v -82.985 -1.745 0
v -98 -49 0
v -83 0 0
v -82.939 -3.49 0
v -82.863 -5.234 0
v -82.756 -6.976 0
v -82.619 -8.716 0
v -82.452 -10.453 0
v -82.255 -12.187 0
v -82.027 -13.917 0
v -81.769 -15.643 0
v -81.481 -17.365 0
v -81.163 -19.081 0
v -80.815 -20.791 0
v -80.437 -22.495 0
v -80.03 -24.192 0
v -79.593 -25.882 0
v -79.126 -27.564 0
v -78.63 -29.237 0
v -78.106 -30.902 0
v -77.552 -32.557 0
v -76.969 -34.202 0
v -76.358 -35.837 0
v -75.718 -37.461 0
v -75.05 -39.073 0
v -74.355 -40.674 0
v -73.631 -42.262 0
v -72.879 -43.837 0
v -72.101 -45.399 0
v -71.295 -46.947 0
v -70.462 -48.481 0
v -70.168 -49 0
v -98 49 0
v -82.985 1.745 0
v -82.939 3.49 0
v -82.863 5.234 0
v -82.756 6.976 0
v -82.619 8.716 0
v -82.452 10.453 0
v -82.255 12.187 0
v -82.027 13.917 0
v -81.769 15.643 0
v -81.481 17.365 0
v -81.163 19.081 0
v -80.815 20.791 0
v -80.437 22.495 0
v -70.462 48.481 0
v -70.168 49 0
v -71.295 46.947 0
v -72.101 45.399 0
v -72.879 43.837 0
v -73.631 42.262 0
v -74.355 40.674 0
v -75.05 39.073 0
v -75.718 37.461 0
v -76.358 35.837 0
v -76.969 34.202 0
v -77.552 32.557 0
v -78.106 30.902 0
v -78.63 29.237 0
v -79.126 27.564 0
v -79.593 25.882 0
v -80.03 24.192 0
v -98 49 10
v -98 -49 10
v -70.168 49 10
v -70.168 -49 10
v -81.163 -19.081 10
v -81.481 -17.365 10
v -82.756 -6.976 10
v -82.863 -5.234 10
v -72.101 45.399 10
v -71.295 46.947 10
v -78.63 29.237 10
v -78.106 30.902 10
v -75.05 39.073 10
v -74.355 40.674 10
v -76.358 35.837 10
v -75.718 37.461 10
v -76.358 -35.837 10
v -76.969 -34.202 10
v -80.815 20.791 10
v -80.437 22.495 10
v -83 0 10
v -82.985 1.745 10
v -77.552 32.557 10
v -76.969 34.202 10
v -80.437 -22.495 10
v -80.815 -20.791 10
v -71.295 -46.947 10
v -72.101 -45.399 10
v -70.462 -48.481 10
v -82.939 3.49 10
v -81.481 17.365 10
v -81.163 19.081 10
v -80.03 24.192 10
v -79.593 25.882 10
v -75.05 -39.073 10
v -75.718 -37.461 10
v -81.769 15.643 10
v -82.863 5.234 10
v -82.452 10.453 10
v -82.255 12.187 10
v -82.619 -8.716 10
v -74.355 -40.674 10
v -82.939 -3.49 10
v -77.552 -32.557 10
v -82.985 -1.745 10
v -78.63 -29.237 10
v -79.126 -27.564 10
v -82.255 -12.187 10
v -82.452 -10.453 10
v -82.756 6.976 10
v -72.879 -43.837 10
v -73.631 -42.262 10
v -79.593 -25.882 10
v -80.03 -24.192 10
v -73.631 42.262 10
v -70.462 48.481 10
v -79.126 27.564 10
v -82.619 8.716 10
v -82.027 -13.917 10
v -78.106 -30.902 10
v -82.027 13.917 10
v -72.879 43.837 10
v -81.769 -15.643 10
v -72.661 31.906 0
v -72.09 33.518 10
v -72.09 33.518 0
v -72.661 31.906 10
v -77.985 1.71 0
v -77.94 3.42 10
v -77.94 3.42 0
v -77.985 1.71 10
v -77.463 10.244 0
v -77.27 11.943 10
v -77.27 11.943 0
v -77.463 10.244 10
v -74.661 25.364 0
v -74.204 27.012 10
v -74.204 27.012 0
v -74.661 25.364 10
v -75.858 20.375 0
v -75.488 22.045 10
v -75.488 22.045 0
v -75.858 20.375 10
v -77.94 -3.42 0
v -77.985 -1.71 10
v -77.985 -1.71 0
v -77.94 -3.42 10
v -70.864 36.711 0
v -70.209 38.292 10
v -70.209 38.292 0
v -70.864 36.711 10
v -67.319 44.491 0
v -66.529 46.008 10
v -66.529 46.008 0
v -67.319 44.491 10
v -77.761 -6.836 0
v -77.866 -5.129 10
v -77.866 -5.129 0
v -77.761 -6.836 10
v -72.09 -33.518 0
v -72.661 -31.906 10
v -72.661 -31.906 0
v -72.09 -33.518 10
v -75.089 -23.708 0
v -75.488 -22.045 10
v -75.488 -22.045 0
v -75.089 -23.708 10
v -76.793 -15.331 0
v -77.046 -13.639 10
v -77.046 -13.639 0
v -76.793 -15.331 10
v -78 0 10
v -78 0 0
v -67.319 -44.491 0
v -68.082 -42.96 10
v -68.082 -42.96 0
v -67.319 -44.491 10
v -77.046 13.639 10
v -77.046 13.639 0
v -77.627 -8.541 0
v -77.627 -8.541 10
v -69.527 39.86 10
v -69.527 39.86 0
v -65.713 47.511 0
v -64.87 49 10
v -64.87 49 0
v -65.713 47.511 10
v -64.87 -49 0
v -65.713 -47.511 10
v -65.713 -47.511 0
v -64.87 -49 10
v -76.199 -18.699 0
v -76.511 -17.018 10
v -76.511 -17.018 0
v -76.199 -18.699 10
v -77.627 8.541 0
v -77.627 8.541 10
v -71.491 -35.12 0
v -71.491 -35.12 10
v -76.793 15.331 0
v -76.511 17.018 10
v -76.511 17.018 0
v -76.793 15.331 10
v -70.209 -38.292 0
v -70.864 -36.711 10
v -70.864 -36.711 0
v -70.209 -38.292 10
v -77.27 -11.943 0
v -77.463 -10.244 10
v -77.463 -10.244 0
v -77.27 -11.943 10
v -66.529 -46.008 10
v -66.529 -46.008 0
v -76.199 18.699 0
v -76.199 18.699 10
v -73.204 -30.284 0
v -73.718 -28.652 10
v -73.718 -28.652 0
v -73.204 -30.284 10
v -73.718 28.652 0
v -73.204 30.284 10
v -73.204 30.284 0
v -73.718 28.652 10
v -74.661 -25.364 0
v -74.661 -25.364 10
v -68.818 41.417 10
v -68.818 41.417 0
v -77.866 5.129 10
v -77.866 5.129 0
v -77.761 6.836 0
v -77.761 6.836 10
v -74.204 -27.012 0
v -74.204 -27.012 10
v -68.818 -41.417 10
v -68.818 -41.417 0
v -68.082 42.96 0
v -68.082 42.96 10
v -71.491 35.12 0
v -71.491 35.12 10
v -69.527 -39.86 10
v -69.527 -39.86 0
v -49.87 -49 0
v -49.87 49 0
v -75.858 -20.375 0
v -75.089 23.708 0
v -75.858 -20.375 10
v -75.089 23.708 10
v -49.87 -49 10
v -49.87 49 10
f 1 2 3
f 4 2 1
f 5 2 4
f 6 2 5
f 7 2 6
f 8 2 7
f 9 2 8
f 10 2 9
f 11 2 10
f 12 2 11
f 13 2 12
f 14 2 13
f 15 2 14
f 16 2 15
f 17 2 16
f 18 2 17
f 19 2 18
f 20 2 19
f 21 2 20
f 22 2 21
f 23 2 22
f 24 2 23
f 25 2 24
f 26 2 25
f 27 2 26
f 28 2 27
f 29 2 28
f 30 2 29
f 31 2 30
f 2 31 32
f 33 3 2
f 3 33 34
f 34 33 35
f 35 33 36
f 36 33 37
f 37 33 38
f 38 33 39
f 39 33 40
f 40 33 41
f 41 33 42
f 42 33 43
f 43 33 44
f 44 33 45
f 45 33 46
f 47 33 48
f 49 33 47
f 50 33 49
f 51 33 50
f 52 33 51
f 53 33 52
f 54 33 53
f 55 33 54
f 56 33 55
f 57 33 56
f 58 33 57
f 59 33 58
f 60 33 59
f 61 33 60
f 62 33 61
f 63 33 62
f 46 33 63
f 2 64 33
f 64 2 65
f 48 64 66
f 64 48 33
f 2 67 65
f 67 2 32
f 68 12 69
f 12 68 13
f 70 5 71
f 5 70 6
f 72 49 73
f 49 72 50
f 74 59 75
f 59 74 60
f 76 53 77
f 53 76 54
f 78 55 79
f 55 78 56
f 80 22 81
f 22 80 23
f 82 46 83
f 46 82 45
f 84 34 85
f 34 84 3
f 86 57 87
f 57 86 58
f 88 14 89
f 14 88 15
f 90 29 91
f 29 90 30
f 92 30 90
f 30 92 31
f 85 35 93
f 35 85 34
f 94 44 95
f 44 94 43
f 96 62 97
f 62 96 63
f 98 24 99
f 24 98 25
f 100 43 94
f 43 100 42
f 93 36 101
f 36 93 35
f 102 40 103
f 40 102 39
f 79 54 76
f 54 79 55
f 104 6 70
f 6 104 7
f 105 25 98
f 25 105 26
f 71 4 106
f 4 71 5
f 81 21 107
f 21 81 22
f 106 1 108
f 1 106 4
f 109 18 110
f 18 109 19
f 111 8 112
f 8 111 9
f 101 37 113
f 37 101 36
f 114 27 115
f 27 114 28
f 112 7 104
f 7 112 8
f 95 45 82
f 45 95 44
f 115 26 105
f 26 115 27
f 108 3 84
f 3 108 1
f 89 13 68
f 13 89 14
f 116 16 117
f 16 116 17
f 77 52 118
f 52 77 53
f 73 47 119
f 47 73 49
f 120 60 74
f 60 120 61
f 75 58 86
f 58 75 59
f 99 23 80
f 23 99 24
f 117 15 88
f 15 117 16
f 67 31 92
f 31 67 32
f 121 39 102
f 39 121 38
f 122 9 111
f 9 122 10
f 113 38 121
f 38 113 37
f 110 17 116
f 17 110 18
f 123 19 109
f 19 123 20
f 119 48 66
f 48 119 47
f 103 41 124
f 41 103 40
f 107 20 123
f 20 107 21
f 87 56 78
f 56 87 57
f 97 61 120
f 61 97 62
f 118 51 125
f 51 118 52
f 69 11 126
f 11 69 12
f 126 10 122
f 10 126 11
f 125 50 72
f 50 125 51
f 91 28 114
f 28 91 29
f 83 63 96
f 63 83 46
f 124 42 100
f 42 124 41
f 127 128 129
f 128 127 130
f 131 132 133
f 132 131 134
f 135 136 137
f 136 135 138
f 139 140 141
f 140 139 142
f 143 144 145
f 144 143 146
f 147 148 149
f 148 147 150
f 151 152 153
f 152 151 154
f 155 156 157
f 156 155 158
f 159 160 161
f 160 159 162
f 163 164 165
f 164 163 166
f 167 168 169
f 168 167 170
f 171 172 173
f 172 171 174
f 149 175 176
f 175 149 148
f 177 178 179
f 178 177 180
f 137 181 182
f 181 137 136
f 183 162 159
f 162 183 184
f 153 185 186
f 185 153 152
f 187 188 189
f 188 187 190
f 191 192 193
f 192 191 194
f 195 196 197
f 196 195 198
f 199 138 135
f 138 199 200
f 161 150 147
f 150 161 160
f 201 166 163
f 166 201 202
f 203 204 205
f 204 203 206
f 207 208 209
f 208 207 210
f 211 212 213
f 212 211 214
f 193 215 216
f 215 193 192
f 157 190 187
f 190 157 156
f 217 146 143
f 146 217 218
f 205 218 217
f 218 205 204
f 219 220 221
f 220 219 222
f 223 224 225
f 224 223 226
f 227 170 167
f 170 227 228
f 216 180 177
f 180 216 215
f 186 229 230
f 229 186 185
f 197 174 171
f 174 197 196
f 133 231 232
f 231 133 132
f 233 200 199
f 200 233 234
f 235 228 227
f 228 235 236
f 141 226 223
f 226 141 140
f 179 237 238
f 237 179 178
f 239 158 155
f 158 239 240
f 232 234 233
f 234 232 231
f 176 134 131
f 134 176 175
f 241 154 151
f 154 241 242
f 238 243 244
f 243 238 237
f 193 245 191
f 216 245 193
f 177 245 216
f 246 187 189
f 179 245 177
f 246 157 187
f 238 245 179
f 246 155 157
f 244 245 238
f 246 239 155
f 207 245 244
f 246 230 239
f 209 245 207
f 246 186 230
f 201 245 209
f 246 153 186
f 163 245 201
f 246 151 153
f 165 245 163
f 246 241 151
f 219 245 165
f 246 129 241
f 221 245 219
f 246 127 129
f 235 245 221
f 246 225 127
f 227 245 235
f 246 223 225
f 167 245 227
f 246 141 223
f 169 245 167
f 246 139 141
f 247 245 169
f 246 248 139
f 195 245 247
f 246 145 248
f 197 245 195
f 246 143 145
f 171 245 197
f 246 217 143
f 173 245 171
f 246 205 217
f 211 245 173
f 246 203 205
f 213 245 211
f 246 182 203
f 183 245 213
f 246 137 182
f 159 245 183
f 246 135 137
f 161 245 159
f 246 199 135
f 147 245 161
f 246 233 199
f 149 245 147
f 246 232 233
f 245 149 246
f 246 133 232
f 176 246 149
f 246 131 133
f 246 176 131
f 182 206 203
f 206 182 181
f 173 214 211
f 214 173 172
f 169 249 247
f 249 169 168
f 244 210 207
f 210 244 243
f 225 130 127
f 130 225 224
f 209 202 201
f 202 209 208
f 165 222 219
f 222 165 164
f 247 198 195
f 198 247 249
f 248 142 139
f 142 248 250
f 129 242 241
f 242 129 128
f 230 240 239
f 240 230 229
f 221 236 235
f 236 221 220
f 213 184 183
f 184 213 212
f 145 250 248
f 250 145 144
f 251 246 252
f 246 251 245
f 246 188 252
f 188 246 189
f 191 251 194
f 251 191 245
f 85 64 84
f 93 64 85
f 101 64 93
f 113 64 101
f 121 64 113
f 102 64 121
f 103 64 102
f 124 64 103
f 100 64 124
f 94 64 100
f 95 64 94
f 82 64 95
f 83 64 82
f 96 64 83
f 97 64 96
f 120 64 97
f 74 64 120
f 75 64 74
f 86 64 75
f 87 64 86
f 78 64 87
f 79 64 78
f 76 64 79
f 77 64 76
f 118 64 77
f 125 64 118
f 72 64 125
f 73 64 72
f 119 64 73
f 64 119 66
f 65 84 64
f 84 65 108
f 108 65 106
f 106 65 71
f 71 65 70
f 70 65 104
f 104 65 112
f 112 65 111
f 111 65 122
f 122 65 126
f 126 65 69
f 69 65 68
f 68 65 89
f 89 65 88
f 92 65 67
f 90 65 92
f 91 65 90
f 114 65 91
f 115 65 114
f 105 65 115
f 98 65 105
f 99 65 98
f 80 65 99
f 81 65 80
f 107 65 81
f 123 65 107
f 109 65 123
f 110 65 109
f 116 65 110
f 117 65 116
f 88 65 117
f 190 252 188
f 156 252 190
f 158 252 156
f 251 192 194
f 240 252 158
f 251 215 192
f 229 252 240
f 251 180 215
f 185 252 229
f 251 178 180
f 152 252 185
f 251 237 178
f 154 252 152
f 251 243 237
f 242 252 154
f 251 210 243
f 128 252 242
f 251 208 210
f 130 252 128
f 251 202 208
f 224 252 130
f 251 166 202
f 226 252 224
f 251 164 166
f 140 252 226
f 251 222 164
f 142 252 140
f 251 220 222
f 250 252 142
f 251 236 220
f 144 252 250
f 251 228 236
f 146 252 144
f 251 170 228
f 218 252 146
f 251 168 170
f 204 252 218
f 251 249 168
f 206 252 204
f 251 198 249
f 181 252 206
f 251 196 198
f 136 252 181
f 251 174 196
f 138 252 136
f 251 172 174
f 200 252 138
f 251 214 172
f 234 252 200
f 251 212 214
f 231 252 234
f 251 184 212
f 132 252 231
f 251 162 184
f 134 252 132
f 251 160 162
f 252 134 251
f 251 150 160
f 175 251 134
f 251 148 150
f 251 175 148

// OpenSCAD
// Former height
height = 20;
// Outer radius
radius = 100;
// Material thickness
thickness = 2;
// Maximal bed width
maxWidth = 200;
// Maximal bed length
maxLength = 200;
// The padding of the parts
padding = 15;
// space between the parts, added to thickness
space = 3;

/* [Hidden] */
$fn = 360;

// calculated
radiusInner = radius - thickness;
segmentHeight = radiusInner - sqrt((radiusInner * radiusInner) - (radiusInner/2) * (radiusInner/2));

intersection() {
    union() {
        // The U shaped part
        difference() {
            translate([-radiusInner / 2, 0, height / 2])
                cube([radiusInner, radiusInner, height], center=true);

            translate([thickness + padding, 0, -1])
                cylinder(r=radius, h=height + 2);
        }

        // The D shaped part
        intersection() {
            translate([thickness + padding + space, 0, 0])
                cylinder(r=radiusInner, h=height);
            
            translate([-segmentHeight / 2 + padding / 2- radiusInner + segmentHeight + padding + thickness + space, 0, height / 2])
                cube([segmentHeight + padding
            , radiusInner, height], center=true);
            
        }
    }
    
    translate([-radiusInner + padding *2, 0, 0])
        cube([maxWidth, maxLength, height], center=true);
}
